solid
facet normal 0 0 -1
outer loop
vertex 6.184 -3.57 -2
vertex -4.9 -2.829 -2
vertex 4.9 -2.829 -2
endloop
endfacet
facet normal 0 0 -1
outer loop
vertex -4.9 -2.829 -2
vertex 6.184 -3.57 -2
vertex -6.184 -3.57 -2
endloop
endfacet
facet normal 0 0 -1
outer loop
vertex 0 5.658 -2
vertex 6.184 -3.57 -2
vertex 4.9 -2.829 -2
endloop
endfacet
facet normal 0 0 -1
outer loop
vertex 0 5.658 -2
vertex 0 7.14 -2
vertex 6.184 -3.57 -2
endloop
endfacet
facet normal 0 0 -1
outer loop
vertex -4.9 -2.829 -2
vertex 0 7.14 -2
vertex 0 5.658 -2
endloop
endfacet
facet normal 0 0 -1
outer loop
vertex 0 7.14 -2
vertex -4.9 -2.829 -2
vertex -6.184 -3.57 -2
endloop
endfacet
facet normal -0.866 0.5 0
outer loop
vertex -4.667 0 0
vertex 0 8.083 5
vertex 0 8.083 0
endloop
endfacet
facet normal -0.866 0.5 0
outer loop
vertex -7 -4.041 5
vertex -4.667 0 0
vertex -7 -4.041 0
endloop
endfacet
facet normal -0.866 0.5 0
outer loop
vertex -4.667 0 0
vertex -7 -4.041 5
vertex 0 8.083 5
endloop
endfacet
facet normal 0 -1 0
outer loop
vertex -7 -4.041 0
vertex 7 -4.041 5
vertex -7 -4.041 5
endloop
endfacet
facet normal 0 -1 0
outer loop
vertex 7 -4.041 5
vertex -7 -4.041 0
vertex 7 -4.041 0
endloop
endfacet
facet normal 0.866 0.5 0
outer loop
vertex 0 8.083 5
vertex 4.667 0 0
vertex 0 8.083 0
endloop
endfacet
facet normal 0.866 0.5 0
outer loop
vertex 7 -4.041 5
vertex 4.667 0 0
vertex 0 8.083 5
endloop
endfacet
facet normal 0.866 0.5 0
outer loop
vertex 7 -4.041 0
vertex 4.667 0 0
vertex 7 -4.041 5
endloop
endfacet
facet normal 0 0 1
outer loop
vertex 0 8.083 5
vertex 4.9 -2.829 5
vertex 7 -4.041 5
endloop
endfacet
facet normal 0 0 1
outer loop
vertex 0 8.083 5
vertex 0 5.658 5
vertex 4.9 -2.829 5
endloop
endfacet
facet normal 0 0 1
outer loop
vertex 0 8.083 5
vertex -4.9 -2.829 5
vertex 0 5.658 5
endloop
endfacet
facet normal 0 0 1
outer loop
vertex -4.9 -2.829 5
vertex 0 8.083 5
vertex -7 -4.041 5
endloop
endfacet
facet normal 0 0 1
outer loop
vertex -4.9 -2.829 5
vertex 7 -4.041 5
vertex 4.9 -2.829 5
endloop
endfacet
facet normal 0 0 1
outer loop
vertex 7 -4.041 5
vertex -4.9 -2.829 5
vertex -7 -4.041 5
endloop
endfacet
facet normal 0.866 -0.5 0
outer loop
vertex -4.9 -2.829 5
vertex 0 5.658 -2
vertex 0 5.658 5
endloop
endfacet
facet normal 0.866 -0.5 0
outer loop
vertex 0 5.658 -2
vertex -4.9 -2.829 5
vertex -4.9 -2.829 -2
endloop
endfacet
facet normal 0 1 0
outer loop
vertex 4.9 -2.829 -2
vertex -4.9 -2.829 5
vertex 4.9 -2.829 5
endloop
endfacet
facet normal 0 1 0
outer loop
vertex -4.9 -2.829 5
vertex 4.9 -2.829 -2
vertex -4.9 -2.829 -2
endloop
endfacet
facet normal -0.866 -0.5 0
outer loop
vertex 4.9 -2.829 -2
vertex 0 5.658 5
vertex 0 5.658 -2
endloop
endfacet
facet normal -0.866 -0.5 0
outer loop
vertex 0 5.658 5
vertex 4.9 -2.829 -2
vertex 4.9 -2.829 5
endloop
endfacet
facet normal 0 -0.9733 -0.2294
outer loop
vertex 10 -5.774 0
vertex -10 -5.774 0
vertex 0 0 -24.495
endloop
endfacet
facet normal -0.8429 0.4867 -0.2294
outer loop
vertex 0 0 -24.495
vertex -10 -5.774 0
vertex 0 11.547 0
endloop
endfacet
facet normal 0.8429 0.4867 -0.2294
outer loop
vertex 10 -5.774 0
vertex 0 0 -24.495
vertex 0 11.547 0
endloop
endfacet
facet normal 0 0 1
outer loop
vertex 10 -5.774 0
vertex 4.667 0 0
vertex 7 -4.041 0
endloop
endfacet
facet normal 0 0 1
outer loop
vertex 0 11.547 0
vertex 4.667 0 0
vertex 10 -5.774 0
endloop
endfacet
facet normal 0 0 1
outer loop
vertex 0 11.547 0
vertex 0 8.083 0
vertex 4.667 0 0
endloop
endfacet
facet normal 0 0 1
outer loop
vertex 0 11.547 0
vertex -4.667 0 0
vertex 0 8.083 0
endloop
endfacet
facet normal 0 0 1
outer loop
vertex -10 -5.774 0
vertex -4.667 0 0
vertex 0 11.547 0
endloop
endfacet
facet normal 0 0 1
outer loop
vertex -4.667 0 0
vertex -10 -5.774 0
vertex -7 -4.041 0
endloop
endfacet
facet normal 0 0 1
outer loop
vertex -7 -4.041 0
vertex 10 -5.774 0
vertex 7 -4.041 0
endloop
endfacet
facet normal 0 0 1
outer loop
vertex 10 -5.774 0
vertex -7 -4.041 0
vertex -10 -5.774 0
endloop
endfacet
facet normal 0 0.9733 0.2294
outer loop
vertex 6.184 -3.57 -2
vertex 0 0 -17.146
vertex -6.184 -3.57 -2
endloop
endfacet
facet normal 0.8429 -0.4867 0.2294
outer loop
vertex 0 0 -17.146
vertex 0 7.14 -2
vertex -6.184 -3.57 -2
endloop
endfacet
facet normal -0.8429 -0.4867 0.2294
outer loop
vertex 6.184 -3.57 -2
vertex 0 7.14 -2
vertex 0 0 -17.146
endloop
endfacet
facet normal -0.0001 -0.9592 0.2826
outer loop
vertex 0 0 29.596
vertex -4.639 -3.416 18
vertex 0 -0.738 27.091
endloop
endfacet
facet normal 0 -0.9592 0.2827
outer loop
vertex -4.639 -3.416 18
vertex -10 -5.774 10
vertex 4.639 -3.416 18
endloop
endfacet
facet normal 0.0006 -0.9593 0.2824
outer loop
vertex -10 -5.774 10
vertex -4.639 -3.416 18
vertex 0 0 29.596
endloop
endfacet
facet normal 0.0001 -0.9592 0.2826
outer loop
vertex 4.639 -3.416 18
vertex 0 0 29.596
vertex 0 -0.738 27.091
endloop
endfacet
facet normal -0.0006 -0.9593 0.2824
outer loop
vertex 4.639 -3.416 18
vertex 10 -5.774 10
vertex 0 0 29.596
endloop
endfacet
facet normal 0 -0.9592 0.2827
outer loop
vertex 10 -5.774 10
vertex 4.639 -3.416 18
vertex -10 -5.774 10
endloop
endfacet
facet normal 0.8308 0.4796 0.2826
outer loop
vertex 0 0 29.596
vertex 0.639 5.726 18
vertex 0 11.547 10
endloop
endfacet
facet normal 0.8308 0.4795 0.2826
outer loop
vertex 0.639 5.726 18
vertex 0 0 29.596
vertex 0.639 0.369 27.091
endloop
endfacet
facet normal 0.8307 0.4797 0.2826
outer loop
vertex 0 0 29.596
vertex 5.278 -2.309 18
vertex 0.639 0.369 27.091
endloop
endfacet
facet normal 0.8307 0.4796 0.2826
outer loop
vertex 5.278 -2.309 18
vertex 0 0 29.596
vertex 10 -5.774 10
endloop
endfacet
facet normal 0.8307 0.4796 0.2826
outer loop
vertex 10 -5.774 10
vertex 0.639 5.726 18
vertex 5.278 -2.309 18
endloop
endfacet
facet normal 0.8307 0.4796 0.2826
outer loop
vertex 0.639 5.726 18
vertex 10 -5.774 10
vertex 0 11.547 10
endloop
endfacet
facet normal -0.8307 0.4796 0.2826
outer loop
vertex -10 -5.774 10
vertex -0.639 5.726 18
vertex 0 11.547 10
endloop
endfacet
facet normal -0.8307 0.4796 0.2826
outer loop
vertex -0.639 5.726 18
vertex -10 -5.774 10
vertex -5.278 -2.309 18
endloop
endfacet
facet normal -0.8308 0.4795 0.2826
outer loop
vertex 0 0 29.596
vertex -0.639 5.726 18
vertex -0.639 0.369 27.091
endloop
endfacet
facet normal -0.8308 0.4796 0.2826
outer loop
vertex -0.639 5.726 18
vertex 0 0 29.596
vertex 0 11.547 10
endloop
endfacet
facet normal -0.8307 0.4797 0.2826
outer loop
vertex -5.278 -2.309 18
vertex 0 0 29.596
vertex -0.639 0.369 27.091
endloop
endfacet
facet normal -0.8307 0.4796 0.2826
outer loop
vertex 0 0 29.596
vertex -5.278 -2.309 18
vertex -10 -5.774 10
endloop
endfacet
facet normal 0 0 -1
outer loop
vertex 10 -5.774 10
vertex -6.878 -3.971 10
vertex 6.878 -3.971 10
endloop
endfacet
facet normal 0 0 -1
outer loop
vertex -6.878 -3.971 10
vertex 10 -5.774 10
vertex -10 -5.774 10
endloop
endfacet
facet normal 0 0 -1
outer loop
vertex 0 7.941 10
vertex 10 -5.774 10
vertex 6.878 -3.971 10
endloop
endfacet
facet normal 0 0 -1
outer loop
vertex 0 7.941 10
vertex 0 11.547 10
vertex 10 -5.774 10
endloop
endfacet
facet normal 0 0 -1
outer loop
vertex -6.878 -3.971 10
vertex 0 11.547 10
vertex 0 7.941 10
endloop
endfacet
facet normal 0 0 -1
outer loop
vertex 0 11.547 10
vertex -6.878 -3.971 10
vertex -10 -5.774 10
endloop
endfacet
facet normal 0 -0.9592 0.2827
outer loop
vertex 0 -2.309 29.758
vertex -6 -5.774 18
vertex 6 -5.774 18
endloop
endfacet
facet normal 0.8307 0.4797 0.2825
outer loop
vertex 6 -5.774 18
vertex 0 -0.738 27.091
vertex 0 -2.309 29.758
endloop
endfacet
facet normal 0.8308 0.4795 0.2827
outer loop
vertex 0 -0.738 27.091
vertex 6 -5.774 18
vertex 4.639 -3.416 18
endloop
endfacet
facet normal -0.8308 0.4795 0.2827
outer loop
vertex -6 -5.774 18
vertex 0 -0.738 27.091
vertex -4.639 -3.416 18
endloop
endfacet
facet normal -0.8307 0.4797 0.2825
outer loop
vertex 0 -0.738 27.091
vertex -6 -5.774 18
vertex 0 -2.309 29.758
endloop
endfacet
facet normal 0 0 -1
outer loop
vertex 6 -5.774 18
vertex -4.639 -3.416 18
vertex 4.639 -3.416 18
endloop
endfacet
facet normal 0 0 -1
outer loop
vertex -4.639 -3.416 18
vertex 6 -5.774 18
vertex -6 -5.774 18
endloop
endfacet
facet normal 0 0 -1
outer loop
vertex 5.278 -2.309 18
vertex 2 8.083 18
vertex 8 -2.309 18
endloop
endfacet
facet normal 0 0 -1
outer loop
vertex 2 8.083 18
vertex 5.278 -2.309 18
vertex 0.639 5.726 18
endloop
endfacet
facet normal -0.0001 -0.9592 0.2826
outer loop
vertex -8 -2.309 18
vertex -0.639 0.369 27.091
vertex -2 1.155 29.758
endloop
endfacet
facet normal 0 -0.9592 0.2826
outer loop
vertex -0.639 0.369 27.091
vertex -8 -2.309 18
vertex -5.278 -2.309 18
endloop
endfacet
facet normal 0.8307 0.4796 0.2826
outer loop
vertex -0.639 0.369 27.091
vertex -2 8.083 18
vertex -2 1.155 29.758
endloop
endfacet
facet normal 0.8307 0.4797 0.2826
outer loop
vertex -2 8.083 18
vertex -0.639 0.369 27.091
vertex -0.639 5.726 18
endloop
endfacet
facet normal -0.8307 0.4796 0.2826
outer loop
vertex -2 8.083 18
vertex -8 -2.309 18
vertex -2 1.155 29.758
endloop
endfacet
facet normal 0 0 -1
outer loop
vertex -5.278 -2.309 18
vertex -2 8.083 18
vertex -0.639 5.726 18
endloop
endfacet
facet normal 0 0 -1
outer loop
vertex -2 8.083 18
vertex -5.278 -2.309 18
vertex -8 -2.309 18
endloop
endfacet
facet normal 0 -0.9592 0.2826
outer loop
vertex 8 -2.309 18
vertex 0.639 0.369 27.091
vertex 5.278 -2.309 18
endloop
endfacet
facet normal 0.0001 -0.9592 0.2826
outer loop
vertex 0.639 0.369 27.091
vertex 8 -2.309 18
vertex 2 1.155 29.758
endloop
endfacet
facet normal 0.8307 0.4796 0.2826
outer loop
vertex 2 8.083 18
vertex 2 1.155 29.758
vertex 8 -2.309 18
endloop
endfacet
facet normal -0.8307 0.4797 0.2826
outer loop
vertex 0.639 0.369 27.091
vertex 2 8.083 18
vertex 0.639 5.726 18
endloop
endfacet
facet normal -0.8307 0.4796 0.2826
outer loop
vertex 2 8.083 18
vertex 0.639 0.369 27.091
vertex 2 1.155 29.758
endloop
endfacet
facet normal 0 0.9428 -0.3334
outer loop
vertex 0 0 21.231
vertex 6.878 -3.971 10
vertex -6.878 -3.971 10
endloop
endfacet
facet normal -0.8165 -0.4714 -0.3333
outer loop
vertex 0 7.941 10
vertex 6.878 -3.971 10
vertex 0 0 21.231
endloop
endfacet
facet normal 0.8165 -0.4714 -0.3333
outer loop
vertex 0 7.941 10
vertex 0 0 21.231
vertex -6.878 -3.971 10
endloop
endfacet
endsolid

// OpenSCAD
// file: Common.scad
// Create a 3-d pyramid with a triangular base (thus 4 sides/faces).
module triangularPyramid(sideLength=20) {
    // For a 4-sided pyramid, make the maximum y coordinate such that
    // each side of the pyramid is length 20.
    triangularHeight = sideLength * sin(60);
    // Make the y coordinate for the top of the pyramid the center of
    // an equilateral triangle on the xy plane with sides of length 20.
    topY = sideLength * 0.5 * tan(30);
    // To find the topZ height, start from [-triangularHeight, 0]
    // (viewing yz plane, so x coordinates make no sense)
    // and move up (positive z direction) 20 units at an angle to intersect
    // at (-topY, topZ).
    // So (triangularHeight - topY)^2 + (topZ)^2 == 20^2
    // and we solve for topZ
    deltaYForTop = triangularHeight - topY;
    topZ = sqrt(sideLength * sideLength - deltaYForTop * deltaYForTop);

    polyhedron(
        // the three points at base
        points= [ [0,0,0],[sideLength,0,0],[sideLength * 0.5, triangularHeight, 0],
        // the apex point
                  [sideLength * 0.5, topY, topZ]  ],
        // each triangle side
        faces=[ [0,3,1],[1,3,2],[2,3,0],[0,1,2] ]);
}

module trianglularConnector(sideLength = 20) {
    height = sideLength * sin(60);

    polyhedron(
        points = [ [0,0, 0], [sideLength,0, 0], [sideLength * 0.5, height,  0],
                   [0,0,10], [sideLength,0,10], [sideLength * 0.5, height, 10] ],
        faces = [ /* bottom */ [0, 1, 2], /* top */ [3, 5, 4],
            /* 3 sides: */ [0, 3, 4, 1], [1, 4, 5, 2], [2, 5, 3, 0] ]);
}

module TopPiece() {
    // The top
    scale([1, 1, 1.2]) // is stretched out vertically a bit
    triangularPyramid();

    //
    // 3 little pyramids sticking out of the top:
    //
    littleScale = 0.6;

    // 1. is on the x axis
    translate([10 * (1 - littleScale), 0, 8])
    scale(littleScale)
    scale([1, 1, 1.2])
    triangularPyramid();

    mainTopY = 20 * 0.5 * tan(30);
    littleTopY = mainTopY * littleScale;
    topToTopDist = mainTopY - littleTopY;

    // 2. is rotated clockwise 120 degrees around the top-to-bottom line
    //    To do that rotation, translate the pyramid to be centered over 0,0,z
    //    then rotate, then untranslate.
    //    However, rotating a triangle by 120 degrees is the same triangle, so
    //    we will just move the thing a little off in the -x, +y direction :-)
    translate([-1 * topToTopDist * cos(30), topToTopDist * (1 + sin(30)), 0])
    translate([10 * (1 - littleScale), 0, 8])
    scale(littleScale)
    scale([1, 1, 1.2])
    triangularPyramid();

    // 3. is rotated counter-clockwise 120 degrees around the top-to-bottom line
    //    To do that rotation, translate the pyramid to be centered over 0,0,z
    //    then rotate, then untranslate.
    //    However, rotating a triangle by 120 degrees is the same triangle, so
    //    we will just move the thing a little off in the +x, +y direction :-)
    translate([topToTopDist * cos(30), topToTopDist * (1 + sin(30)), 0])
    translate([10 * (1 - littleScale), 0, 8])
    scale(littleScale)
    scale([1, 1, 1.2])
    triangularPyramid();
}

module BottomPiece() {
    // The bottom
    scale([1, 1, 1.5]) // is stretched out vertically a bit
    translate([20,0,0])
    rotate([0,180,0])
    triangularPyramid();
}
// file: GorgSuperChip.scad
// Gorg Super-Chip, top piece
// (it's mostly marketing)

// Using this picture as a reference:
// http://dreamworks.wikia.com/wiki/Gorg_Super-Chip

use <Common.scad>;

translate([-10, -10 * tan(30), 10])
color("DimGrey") {
      topHoleScale = 0.7;
      mainTopY = 20 * 0.5 * tan(30);
      littleTopY = mainTopY * topHoleScale;
      topToTopDist = mainTopY - littleTopY;
      echo(topToTopDist);
      difference() {
        TopPiece();

        translate([10 * (1 - topHoleScale), topToTopDist, -0.2])
        scale(topHoleScale)
        triangularPyramid();
    }
}
// file: GorgSuperChipBottom.scad
// Gorg Super-Chip, bottom piece
// (it's mostly marketing)

// Using this picture as a reference:
// http://dreamworks.wikia.com/wiki/Gorg_Super-Chip

use <Common.scad>;

color("DimGrey") {
    holeScale = 0.7;

    translate([0,0,-2])
    scale(holeScale)
    difference() {
        translate([-10, -10 * tan(30), 0])
        trianglularConnector();

        scale([holeScale, holeScale, 1.1])
        translate([-10, -10 * tan(30), 0])
        trianglularConnector();
    }

    difference() {
        translate([-10, -10 * tan(30), 0])
        BottomPiece();

        scale(holeScale)
        translate([-10, -10 * tan(30), 0])
        BottomPiece();
    }
}
// main file
include <GorgSuperChipBottom.scad>;

include <GorgSuperChip.scad>;
